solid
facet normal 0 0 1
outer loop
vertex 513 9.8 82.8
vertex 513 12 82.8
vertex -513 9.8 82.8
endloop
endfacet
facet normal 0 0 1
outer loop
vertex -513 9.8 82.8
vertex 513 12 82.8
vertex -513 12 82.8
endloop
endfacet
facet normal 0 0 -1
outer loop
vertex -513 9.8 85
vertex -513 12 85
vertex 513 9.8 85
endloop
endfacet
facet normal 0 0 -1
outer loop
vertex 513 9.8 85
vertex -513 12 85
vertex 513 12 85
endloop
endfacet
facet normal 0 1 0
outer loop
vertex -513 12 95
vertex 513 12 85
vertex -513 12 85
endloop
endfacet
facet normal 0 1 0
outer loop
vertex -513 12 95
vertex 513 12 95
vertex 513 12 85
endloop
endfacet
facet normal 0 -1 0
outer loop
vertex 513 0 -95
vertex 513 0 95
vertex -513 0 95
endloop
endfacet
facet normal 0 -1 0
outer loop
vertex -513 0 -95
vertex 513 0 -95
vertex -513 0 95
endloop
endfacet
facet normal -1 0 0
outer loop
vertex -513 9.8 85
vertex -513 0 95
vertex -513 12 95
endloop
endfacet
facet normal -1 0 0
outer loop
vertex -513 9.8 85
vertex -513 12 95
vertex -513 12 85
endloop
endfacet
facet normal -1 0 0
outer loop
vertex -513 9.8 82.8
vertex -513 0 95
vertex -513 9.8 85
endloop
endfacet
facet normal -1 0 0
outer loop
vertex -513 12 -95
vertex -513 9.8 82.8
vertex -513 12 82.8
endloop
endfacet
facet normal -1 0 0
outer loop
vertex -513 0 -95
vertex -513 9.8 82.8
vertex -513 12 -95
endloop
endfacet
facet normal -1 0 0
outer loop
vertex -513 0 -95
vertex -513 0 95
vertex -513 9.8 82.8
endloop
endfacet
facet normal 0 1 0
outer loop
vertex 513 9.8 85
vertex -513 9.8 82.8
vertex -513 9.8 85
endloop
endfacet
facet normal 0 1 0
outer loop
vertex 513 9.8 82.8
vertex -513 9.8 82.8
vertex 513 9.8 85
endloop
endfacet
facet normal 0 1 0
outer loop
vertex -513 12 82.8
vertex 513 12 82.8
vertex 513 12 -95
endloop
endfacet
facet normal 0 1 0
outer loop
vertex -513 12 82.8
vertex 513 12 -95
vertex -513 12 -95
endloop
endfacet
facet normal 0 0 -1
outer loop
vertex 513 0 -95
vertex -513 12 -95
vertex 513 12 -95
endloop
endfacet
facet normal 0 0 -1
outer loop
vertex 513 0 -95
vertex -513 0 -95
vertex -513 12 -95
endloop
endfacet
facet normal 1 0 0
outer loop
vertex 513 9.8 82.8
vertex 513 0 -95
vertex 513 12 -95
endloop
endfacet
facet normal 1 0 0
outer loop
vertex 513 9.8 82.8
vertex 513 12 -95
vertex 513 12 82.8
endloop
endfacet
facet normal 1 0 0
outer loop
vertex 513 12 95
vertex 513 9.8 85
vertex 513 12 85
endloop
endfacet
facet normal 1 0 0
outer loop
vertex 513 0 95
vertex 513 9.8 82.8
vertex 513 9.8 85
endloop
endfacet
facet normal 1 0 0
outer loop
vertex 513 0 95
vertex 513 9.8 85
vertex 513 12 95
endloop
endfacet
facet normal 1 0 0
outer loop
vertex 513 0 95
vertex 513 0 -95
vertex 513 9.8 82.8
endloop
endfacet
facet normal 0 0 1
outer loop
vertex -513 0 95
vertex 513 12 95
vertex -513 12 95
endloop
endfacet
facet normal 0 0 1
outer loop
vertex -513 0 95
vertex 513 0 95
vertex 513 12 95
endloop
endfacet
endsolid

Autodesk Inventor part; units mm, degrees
ref_plane "YZ Plane" through (0, 0, 0) normal (1, 0, 0) x (0, 1, 0)
ref_plane "XZ Plane" through (0, 0, 0) normal (0, 1, 0) x (-1, 0, 0)
ref_plane "XY Plane" through (0, 0, 0) normal (0, 0, 1) x (1, 0, 0)
sketch "Skizze1" plane through (0, 0, 0) normal (0, 1, 0) x (-1, 0, 0)
  line L0 (-513, 95) -> (513, 95)
  line L1 (513, 95) -> (513, -95)
  line L2 (513, -95) -> (-513, -95)
  line L3 (-513, -95) -> (-513, 95)
  point P0 (0, 0)
  point P1 (0, 95)
  point P2 (513, 0)
  dimension "d0" = 1026
  dimension "d1" = 190
extrude "Extrusion1" add sketch "Skizze1" along normal blind 12
sketch "Skizze2" plane through (0, 12, 0) normal (0, 1, 0) x (1, 0, 0)
  line L0 (513, 95) -> (-513, 95) projected
  line L1 (-513, 95) -> (-513, -95) projected
  line L2 (-513, -95) -> (513, -95) projected
  line L3 (513, -95) -> (513, 95) projected
  line L4 (-513, -85) -> (513, -85)
  line L5 (513, -85) -> (513, -82.8)
  line L6 (513, -82.8) -> (-513, -82.8)
  line L7 (-513, -82.8) -> (-513, -85)
  point P0 (0, 0)
  dimension "d4" = 2.2
  dimension "d5" = 10
extrude "Extrusion2" cut sketch "Skizze2" against normal blind 2.2 contours L3 L4 L1 L6
equation "\"d6\" = d4"
properties part number "Längsseite_Gehäuse" material "Holz (Kirsche)"
